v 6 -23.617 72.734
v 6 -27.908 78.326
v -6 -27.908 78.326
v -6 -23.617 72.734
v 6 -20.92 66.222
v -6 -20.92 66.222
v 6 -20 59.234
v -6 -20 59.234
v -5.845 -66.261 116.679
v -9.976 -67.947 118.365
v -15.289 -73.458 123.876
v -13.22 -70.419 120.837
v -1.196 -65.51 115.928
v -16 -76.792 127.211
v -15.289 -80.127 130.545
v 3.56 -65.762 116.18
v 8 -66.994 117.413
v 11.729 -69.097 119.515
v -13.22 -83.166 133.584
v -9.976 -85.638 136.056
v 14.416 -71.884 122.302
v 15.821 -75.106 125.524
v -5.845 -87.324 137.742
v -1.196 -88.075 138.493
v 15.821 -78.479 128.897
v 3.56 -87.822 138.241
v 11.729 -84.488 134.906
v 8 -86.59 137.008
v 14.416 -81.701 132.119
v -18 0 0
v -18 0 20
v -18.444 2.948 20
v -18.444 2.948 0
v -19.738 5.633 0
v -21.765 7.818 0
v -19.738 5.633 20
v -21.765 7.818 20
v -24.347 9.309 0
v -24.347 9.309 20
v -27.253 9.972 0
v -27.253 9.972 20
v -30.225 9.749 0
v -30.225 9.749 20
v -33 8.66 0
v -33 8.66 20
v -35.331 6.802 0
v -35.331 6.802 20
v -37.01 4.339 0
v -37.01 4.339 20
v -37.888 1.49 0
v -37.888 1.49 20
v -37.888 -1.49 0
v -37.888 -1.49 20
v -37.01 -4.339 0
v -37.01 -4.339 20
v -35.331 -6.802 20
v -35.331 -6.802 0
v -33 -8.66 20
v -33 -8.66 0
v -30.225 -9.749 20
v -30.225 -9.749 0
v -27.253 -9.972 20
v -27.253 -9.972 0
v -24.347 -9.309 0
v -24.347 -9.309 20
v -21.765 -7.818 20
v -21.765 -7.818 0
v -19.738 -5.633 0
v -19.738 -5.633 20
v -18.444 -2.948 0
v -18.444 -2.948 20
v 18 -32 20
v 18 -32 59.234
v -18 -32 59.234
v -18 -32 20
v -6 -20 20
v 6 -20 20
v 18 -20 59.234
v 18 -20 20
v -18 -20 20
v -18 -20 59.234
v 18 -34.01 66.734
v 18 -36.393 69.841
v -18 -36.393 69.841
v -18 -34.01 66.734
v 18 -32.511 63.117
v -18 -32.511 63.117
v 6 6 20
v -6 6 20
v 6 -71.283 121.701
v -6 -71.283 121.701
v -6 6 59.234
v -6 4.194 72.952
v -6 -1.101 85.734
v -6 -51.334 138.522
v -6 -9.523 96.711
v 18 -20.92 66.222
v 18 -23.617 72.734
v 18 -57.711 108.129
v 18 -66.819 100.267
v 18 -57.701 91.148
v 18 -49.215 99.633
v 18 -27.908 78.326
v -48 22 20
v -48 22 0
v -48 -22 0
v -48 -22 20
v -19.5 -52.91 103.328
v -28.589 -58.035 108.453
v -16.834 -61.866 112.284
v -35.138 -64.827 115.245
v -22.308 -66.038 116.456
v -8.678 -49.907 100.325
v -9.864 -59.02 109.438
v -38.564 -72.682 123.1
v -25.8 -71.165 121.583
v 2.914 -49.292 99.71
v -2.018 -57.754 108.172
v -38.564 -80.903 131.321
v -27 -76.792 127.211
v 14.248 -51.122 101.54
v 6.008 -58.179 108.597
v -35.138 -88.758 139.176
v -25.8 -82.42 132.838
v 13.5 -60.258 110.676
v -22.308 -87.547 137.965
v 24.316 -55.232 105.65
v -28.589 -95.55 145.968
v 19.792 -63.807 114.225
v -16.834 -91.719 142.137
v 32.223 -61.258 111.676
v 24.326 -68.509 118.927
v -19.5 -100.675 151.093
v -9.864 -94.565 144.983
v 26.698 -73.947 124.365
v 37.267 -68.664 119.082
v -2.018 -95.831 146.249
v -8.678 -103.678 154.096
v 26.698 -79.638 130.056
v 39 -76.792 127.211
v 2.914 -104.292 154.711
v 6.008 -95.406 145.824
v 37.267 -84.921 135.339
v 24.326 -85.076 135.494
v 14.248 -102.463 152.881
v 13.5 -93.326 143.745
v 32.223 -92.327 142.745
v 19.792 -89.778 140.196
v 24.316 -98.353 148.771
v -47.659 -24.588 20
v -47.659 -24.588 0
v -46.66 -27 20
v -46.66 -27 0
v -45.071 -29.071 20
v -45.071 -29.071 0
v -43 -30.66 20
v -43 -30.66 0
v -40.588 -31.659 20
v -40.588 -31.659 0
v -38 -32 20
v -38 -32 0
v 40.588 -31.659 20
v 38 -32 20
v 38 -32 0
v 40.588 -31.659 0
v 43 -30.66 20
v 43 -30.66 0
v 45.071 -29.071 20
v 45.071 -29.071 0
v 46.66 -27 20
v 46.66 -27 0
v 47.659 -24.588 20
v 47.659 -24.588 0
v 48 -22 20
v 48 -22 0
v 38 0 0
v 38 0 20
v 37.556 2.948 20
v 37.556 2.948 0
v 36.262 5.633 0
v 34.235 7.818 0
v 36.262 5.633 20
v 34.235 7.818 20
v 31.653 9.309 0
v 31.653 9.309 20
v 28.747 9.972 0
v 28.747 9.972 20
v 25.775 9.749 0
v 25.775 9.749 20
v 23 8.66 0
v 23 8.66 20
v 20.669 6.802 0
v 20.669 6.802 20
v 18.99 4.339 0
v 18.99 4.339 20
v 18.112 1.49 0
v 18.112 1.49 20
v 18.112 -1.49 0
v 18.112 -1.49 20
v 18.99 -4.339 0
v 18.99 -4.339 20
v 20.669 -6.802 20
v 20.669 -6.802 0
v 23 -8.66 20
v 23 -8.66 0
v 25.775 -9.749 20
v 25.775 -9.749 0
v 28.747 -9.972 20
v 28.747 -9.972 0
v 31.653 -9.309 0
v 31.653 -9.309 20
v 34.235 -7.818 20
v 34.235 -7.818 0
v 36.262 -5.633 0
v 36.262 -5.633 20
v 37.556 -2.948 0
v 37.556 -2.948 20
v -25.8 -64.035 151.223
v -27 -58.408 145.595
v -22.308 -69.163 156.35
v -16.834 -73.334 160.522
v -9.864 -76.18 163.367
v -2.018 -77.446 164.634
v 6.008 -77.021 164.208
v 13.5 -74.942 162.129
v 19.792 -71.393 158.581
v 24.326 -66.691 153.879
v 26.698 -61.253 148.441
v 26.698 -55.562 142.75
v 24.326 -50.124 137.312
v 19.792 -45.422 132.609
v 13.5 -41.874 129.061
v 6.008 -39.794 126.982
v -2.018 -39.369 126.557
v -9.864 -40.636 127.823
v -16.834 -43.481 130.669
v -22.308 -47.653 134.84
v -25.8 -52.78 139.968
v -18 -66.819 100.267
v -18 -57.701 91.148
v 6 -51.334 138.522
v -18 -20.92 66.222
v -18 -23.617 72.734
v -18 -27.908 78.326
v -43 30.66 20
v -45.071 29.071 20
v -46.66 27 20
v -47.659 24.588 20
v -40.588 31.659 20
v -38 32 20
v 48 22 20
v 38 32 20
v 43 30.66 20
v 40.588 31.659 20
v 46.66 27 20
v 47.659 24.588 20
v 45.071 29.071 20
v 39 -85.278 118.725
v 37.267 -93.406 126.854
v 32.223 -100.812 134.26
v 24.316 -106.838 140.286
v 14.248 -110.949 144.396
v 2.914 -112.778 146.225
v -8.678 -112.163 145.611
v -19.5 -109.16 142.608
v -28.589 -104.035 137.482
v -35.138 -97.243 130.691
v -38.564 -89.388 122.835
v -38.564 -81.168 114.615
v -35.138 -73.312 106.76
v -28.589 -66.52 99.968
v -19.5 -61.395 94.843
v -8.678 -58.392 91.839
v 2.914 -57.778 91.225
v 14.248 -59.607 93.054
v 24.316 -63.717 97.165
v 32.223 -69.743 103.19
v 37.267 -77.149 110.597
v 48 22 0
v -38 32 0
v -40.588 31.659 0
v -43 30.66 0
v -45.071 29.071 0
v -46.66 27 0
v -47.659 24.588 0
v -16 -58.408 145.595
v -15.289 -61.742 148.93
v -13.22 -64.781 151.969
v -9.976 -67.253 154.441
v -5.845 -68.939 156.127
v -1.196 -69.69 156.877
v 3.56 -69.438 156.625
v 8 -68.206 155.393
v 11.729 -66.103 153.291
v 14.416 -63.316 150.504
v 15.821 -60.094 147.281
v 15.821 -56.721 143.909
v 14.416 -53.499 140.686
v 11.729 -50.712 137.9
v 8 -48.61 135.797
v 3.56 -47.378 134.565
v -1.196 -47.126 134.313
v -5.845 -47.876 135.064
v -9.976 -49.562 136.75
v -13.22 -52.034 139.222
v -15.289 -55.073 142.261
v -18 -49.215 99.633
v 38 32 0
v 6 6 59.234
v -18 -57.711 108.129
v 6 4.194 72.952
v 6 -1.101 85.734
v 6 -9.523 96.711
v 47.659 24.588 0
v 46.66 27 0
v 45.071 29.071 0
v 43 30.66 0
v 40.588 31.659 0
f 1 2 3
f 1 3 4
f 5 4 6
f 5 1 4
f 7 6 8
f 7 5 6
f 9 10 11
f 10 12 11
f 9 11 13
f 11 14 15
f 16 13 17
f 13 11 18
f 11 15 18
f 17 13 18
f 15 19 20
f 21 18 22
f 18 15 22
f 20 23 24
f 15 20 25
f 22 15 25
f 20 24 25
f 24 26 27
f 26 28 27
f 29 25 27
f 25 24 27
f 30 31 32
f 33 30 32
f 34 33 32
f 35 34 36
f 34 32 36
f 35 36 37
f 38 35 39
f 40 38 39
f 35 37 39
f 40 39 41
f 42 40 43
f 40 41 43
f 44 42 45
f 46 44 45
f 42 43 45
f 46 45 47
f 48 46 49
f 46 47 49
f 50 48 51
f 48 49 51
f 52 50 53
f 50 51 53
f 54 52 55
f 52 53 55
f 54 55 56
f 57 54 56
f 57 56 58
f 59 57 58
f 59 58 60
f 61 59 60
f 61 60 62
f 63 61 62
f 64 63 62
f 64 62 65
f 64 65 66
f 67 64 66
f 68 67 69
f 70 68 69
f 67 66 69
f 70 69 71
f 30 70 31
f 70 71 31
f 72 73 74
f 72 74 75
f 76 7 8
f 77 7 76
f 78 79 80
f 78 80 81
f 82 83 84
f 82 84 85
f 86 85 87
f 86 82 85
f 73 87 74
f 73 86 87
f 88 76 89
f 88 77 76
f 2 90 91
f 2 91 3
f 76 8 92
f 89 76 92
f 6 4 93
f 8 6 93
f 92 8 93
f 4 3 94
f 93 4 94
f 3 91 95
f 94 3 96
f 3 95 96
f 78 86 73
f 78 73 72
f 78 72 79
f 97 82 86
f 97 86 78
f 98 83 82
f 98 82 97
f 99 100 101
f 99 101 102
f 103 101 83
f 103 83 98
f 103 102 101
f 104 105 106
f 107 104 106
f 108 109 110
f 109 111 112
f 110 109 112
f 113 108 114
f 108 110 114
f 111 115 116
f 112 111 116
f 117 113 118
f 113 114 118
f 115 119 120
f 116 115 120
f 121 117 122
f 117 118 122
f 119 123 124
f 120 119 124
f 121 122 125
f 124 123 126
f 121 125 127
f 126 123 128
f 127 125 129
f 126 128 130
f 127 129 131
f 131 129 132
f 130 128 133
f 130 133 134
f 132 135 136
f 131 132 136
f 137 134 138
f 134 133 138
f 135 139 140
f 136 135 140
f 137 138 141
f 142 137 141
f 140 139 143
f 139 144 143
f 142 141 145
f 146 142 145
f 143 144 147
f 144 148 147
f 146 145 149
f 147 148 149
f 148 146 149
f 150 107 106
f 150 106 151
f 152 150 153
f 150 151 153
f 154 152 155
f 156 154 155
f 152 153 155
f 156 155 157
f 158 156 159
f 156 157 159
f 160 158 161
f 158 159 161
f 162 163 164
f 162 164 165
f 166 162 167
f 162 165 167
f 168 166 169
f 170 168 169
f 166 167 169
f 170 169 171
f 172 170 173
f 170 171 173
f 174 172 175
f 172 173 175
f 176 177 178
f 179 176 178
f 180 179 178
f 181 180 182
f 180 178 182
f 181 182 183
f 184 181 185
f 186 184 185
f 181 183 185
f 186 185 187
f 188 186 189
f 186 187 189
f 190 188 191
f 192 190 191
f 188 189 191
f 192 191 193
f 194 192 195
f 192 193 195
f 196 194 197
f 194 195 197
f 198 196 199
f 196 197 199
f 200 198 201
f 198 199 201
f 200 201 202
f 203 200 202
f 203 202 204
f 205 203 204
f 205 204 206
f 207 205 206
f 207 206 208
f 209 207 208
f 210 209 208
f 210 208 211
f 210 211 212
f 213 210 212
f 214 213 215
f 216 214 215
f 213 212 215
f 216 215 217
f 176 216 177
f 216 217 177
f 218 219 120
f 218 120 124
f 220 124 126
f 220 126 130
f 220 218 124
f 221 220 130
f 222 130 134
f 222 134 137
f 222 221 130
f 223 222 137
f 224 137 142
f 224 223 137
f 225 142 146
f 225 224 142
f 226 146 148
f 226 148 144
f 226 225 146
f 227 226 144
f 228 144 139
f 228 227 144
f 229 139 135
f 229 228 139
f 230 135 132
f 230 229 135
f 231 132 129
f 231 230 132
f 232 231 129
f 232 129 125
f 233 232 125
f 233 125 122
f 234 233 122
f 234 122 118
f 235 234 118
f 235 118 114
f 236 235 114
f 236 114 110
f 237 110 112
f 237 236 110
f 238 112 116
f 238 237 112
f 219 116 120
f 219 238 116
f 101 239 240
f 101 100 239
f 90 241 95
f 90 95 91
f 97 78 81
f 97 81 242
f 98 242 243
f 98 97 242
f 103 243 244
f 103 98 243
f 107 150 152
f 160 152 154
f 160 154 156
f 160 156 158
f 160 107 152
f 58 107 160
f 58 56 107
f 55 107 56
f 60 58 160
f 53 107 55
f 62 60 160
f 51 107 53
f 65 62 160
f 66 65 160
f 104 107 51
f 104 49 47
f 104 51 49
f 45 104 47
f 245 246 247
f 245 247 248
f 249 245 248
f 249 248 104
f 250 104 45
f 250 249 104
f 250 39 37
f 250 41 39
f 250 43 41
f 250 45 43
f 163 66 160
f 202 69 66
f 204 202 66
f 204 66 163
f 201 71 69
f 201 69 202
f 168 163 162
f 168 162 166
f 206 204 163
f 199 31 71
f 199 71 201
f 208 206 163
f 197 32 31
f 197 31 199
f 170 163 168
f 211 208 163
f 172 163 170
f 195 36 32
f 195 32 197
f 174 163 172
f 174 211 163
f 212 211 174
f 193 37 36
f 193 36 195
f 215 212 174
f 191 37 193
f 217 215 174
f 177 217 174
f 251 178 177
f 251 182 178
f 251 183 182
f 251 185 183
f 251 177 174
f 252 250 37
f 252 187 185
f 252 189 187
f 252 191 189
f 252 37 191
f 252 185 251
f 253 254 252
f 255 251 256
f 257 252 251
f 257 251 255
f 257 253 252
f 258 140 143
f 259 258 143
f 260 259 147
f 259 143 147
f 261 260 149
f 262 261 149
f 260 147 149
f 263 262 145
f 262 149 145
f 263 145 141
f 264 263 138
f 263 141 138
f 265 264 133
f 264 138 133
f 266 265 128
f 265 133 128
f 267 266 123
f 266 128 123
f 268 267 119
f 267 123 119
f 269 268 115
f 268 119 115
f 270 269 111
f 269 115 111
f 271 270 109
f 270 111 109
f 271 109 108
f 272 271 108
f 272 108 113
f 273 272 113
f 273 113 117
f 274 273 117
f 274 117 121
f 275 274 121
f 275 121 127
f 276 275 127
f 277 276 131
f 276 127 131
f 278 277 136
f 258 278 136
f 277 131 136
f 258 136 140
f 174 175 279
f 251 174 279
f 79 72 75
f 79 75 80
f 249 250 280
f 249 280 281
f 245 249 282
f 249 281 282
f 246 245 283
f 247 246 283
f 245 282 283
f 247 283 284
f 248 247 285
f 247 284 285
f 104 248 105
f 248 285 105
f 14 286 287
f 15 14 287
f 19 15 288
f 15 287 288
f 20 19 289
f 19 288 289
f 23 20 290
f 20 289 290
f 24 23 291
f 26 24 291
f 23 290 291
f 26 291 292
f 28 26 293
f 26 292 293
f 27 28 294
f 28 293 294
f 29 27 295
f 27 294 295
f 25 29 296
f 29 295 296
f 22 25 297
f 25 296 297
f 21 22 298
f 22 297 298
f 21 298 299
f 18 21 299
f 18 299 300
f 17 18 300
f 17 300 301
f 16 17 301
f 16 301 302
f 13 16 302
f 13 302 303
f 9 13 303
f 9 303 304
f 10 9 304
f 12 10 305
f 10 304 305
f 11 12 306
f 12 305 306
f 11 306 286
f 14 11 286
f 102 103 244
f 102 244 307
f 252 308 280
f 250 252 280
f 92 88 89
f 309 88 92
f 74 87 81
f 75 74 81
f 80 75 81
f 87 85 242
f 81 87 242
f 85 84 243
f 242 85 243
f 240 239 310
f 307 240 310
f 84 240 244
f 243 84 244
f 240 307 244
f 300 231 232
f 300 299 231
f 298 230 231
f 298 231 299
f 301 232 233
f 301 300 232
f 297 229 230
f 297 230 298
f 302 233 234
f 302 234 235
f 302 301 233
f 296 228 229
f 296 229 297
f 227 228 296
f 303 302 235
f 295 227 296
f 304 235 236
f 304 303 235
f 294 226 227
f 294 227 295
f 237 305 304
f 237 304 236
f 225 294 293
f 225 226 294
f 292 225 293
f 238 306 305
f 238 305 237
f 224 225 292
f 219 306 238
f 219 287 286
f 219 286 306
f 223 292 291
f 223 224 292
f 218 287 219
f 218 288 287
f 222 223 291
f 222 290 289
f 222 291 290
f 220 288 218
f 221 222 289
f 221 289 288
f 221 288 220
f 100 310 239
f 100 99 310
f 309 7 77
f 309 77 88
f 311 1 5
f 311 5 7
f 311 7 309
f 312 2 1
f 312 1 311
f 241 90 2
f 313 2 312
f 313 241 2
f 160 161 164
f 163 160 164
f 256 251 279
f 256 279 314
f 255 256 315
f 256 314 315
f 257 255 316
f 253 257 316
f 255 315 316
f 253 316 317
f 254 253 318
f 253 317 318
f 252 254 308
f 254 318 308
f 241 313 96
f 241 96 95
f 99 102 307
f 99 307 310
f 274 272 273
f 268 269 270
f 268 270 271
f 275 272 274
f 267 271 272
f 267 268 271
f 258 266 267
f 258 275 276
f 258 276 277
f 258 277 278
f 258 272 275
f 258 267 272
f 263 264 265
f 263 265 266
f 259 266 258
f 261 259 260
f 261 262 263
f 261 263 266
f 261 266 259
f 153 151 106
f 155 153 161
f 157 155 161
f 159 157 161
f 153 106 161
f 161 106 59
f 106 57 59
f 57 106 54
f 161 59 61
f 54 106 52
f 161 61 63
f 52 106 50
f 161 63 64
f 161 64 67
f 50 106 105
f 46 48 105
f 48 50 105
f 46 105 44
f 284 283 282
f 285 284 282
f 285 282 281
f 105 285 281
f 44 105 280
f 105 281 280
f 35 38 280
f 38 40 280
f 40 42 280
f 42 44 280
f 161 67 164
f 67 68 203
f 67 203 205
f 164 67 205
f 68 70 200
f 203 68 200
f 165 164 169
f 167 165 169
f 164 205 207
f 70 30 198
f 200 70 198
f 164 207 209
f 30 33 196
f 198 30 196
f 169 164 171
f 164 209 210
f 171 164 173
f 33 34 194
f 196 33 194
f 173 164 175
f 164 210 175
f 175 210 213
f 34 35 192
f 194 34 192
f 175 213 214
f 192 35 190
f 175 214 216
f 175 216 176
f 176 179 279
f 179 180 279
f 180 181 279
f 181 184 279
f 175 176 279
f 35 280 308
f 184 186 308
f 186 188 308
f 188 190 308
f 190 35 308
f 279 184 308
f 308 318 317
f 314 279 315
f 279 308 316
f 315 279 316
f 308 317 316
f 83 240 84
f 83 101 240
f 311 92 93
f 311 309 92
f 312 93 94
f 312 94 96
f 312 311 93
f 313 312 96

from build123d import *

# Parameters (mm, degrees)
F1_DEPTH       = 20
F2_R           = 10
F3_DEPTH       = 20
F6_R           = 27
F6_R_2         = 16
F7_DEPTH       = 26
F8_R           = 39.0000008047
F9_DEPTH       = 12
F11_DEPTH      = 18
F11_DEPTH_BACK = 18
F13_DEPTH      = 6
F13_DEPTH_BACK = 6


with BuildPart() as f1:
    # F0 (on Top) → F1 (new body)
    with BuildSketch(Plane.XY):
        with BuildLine():
            ThreePointArc((48, 22), (45.0710678119, 29.0710678119), (38, 32))
            Line((38, 32), (-38, 32))
            ThreePointArc((-38, 32), (-45.0710678119, 29.0710678119), (-48, 22))
            Line((-48, 22), (-48, -22))
            ThreePointArc((-48, -22), (-45.0710678119, -29.0710678119), (-38, -32))
            Line((-38, -32), (38, -32))
            ThreePointArc((38, -32), (45.0710678119, -29.0710678119), (48, -22))
            Line((48, -22), (48, 22))
        make_face()
    extrude(amount=F1_DEPTH)

    # F2 (on face) → F3 (cut)
    with BuildSketch(Plane.XY.offset(20)):
        with Locations((28, 0)):
            Circle(F2_R)
        with Locations((-28, 0)):
            Circle(F2_R)
    extrude(amount=-F3_DEPTH, mode=Mode.SUBTRACT)


with BuildPart() as f7:
    # F6 (on face) → F7 (new body)
    with BuildSketch(Plane(origin=(0, 43.593807146, 43.593807146), x_dir=(-1, 0, 0), z_dir=(0, 0.7071067812, 0.7071067812))):
        with Locations((0, 144.2518627754)):
            Circle(F6_R)
        with Locations((0, 144.2518627754)):
            Circle(F6_R_2, mode=Mode.SUBTRACT)
    extrude(amount=-F7_DEPTH)

    # F8 (on face) → F9 (join)
    with BuildSketch(Plane(origin=(0, 25.2090308351, 25.2090308351), x_dir=(1, 0, 0), z_dir=(0, -0.7071067812, -0.7071067812))):
        with Locations((0, 144.2518627754)):
            Circle(F8_R)
    extrude(amount=F9_DEPTH)


with BuildPart() as f11:
    # F10 (on Right) → F11 (new body, two sides)
    with BuildSketch(Plane.YZ) as f11_sk:
        with BuildLine():
            Line((-57.7005558711, 91.1480547929), (-36.3933982822, 69.8408972039))
            ThreePointArc((-36.3933982822, 69.8408972039), (-33.1418070123, 64.9745469716), (-32, 59.2342954861))
            Line((-32, 59.2342954861), (-32, 20))
            Line((-32, 20), (-20.0000036222, 20))
            Line((-20.0000036222, 20), (-20.0000036222, 59.2342954861))
            ThreePointArc((-20.0000036222, 59.2342954861), (-22.0552559687, 69.5667467738), (-27.9081194692, 78.3261760169))
            Line((-27.9081194692, 78.3261760169), (-49.2152770582, 99.6333336058))
            Line((-49.2152770582, 99.6333336058), (-57.711340487, 108.1293970346))
            Line((-57.711340487, 108.1293970346), (-66.8190966824, 100.2665956041))
            Line((-66.8190966824, 100.2665956041), (-57.7005558711, 91.1480547929))
        make_face()
    extrude(amount=F11_DEPTH)
    extrude(f11_sk.sketch, amount=-F11_DEPTH_BACK)


with BuildPart() as f13:
    # F12 (on Right) → F13 (new body, two sides)
    with BuildSketch(Plane.YZ) as f13_sk:
        with BuildLine():
            ThreePointArc((5.9999986829, 59.2342954861), (1.9656140063, 79.5165168975), (-9.5233415284, 96.7109539577))
            Line((-9.5233415284, 96.7109539577), (-51.3342692497, 138.5218816789))
            Line((-51.3342692497, 138.5218816789), (-71.2829710805, 121.7010276282))
            Line((-71.2829710805, 121.7010276282), (-27.9081194692, 78.3261760169))
            ThreePointArc((-27.9081194692, 78.3261760169), (-22.0552559687, 69.5667467738), (-20.0000036222, 59.2342954861))
            Line((-20.0000036222, 59.2342954861), (-20.0000036222, 20))
            Line((-20.0000036222, 20), (5.9999986829, 20))
            Line((5.9999986829, 20), (5.9999986829, 59.2342954861))
        make_face()
    extrude(amount=F13_DEPTH)
    extrude(f13_sk.sketch, amount=-F13_DEPTH_BACK)


solid = Compound([f1.part, f7.part, f11.part, f13.part])
